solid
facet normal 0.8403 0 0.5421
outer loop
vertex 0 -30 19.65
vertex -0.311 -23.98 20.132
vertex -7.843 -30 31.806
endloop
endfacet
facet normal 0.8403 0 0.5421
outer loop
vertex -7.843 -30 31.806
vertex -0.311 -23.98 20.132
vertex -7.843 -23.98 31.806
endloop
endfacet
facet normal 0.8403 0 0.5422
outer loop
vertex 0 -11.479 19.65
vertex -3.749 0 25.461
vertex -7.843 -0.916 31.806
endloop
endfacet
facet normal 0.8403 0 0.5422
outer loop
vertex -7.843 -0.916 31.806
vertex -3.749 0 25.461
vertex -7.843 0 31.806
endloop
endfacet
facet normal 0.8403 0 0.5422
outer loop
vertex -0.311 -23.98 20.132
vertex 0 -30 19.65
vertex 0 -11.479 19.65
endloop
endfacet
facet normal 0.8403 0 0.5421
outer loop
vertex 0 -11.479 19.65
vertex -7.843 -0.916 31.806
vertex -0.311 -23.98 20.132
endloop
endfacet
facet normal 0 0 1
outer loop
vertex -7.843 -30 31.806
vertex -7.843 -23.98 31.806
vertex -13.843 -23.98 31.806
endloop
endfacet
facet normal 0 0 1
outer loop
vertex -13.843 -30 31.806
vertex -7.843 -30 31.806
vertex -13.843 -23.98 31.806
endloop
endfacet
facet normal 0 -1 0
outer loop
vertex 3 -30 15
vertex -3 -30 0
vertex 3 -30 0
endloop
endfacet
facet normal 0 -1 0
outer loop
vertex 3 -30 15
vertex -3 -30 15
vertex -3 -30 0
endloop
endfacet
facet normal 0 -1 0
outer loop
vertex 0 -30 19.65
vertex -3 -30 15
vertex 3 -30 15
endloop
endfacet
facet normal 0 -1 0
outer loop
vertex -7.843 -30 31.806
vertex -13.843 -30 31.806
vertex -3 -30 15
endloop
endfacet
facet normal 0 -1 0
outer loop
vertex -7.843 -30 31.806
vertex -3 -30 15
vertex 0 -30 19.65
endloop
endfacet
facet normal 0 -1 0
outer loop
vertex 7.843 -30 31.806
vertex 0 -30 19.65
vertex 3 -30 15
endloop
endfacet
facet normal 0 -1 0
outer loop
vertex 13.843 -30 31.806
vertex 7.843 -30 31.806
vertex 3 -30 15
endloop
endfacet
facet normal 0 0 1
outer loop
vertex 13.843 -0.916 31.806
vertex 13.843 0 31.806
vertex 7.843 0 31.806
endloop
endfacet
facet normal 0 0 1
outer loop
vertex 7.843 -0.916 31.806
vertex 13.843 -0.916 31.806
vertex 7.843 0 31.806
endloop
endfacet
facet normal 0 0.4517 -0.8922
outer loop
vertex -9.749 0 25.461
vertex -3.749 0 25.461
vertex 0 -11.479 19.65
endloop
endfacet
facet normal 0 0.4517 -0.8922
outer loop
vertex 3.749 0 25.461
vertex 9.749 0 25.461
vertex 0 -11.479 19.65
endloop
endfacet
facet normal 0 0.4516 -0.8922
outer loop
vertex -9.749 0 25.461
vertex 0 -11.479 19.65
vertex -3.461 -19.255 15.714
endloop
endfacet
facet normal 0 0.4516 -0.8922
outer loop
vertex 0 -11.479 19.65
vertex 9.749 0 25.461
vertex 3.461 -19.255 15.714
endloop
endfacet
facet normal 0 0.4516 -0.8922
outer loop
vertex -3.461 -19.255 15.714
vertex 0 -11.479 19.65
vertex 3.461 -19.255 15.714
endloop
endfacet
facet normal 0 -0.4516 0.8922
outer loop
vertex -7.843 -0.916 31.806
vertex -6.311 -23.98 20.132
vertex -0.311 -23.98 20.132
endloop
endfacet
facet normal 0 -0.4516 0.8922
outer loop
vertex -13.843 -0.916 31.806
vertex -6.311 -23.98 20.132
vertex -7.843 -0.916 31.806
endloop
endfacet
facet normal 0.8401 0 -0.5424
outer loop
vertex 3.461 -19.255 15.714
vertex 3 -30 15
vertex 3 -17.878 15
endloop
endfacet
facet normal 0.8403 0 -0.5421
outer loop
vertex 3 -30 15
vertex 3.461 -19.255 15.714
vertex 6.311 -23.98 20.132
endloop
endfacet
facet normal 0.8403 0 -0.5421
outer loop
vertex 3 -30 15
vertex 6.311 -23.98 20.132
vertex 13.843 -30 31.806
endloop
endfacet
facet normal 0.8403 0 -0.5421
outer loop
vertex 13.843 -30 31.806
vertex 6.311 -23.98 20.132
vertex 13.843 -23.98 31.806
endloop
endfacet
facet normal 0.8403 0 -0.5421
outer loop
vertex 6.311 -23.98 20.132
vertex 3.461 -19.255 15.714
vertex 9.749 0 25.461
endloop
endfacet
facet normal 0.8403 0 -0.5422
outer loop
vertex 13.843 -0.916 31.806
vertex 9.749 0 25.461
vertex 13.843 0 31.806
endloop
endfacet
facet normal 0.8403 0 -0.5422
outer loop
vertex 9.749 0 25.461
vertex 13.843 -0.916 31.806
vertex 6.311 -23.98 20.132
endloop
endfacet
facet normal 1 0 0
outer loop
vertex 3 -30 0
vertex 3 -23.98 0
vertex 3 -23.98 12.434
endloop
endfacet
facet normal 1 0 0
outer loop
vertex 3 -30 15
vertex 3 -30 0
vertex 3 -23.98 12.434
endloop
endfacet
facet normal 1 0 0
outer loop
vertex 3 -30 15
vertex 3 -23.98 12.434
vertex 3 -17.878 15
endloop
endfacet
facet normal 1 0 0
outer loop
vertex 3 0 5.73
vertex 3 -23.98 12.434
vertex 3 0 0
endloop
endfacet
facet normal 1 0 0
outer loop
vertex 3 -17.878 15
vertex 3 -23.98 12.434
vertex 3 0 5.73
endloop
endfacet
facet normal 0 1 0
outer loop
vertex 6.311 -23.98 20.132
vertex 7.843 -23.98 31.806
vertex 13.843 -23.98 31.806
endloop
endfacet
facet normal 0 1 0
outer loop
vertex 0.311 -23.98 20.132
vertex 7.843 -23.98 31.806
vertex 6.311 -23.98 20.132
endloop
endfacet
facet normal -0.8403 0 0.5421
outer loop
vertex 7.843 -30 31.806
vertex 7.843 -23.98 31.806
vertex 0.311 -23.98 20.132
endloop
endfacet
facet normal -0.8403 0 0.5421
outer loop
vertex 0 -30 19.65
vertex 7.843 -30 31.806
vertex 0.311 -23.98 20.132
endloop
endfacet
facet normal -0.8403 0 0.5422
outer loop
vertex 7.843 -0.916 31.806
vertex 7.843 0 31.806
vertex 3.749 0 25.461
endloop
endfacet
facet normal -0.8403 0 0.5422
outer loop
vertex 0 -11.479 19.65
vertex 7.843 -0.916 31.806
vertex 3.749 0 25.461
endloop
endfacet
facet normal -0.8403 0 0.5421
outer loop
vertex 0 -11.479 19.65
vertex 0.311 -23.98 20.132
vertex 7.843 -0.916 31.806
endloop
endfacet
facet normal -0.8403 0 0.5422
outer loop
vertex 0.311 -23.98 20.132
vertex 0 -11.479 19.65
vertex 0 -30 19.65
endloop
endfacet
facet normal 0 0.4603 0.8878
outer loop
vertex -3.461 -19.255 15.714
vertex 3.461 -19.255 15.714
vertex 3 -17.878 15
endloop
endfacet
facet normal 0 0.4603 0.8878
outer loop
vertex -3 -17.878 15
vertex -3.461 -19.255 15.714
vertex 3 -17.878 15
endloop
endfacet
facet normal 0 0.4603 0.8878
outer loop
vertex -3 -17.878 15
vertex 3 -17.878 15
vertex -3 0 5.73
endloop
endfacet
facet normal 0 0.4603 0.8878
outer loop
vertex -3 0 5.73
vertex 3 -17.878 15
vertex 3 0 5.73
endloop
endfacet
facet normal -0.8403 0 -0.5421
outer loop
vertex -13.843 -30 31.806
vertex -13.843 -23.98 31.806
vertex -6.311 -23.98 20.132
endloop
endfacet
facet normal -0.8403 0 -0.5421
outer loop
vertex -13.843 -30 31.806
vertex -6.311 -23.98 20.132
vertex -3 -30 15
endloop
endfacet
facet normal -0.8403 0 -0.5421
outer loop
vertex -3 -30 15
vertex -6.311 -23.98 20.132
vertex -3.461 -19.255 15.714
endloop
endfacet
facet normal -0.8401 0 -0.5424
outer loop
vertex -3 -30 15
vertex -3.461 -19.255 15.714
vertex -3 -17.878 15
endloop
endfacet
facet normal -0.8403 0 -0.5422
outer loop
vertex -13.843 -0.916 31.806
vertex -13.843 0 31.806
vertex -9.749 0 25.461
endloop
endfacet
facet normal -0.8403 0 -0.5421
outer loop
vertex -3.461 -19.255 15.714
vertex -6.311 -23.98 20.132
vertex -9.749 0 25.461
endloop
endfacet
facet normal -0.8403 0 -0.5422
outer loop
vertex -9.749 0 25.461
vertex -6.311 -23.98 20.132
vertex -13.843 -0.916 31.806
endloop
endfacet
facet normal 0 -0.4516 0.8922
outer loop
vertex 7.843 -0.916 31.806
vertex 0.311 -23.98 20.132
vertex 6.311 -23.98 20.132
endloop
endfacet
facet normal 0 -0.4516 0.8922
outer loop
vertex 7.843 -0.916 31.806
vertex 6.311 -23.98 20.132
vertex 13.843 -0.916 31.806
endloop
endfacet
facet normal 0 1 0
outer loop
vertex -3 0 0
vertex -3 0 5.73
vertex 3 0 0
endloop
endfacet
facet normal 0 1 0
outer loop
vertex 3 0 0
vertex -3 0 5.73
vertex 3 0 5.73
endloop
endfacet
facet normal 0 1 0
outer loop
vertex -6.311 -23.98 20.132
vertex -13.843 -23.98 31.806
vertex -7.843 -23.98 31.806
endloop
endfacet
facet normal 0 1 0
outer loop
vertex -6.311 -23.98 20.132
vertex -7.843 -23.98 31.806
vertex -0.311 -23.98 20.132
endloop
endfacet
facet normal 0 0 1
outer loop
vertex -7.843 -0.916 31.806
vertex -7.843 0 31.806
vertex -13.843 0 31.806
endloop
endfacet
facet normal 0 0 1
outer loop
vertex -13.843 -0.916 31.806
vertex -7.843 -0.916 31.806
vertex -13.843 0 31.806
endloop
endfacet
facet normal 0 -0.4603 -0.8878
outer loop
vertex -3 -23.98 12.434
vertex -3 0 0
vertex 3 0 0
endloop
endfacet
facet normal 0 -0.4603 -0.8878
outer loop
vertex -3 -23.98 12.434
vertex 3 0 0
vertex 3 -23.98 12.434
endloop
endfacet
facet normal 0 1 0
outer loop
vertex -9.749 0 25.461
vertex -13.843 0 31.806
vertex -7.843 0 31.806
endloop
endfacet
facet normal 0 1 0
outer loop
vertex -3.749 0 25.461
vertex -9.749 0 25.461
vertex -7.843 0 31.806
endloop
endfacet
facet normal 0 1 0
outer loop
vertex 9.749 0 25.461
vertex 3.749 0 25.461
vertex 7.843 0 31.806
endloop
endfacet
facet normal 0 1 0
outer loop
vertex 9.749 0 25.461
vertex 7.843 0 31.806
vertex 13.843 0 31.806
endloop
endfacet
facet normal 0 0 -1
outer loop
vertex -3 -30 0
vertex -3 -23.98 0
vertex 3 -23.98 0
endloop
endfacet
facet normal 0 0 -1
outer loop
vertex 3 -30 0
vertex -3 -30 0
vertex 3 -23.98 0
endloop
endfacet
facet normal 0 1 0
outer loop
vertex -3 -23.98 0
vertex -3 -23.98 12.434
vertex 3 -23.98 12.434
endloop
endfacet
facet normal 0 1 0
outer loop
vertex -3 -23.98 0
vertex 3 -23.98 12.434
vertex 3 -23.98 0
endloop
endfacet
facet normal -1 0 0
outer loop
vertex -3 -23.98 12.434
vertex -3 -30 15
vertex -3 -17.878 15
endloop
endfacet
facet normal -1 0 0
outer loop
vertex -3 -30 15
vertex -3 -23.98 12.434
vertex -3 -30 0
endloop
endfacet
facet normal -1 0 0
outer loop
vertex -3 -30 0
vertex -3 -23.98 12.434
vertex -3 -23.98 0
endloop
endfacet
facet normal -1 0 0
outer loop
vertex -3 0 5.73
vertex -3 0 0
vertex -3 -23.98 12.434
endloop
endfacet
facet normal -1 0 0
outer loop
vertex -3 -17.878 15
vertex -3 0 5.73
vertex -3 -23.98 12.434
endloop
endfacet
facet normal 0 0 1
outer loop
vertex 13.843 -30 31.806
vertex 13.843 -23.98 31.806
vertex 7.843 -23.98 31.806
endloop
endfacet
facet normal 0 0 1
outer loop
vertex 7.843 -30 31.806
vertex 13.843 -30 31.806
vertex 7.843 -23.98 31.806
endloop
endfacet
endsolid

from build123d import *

# Parameters (mm, degrees)
F1_DEPTH = 30
F3_DEPTH = 50


with BuildPart() as f1:
    # F0 (on Front) → F1 (new body)
    with BuildSketch(Plane.XZ):
        Polygon((-3, 0), (0, 0), (3, 0), (3, 15), (13.842538, 31.805932), (7.842538, 31.805932), (0, 19.649999), (-7.842538, 31.805932), (-13.842538, 31.805932), (-3, 15), align=None)
    extrude(amount=F1_DEPTH)

    # F2 (on Right) → F3 (cut, symmetric)
    with BuildSketch(Plane.YZ):
        Polygon((-23.980264, 0), (0, 0), (-23.980264, 12.434211), align=None)
        Polygon((-23.980264, 20.131581), (0, 32.269739), (-23.980264, 32.269739), align=None)
        Polygon((0, 5.729885), (0, 25.460526), (-19.255204, 15.714065), align=None)
    extrude(amount=F3_DEPTH, both=True, mode=Mode.SUBTRACT)


solid = f1.part
